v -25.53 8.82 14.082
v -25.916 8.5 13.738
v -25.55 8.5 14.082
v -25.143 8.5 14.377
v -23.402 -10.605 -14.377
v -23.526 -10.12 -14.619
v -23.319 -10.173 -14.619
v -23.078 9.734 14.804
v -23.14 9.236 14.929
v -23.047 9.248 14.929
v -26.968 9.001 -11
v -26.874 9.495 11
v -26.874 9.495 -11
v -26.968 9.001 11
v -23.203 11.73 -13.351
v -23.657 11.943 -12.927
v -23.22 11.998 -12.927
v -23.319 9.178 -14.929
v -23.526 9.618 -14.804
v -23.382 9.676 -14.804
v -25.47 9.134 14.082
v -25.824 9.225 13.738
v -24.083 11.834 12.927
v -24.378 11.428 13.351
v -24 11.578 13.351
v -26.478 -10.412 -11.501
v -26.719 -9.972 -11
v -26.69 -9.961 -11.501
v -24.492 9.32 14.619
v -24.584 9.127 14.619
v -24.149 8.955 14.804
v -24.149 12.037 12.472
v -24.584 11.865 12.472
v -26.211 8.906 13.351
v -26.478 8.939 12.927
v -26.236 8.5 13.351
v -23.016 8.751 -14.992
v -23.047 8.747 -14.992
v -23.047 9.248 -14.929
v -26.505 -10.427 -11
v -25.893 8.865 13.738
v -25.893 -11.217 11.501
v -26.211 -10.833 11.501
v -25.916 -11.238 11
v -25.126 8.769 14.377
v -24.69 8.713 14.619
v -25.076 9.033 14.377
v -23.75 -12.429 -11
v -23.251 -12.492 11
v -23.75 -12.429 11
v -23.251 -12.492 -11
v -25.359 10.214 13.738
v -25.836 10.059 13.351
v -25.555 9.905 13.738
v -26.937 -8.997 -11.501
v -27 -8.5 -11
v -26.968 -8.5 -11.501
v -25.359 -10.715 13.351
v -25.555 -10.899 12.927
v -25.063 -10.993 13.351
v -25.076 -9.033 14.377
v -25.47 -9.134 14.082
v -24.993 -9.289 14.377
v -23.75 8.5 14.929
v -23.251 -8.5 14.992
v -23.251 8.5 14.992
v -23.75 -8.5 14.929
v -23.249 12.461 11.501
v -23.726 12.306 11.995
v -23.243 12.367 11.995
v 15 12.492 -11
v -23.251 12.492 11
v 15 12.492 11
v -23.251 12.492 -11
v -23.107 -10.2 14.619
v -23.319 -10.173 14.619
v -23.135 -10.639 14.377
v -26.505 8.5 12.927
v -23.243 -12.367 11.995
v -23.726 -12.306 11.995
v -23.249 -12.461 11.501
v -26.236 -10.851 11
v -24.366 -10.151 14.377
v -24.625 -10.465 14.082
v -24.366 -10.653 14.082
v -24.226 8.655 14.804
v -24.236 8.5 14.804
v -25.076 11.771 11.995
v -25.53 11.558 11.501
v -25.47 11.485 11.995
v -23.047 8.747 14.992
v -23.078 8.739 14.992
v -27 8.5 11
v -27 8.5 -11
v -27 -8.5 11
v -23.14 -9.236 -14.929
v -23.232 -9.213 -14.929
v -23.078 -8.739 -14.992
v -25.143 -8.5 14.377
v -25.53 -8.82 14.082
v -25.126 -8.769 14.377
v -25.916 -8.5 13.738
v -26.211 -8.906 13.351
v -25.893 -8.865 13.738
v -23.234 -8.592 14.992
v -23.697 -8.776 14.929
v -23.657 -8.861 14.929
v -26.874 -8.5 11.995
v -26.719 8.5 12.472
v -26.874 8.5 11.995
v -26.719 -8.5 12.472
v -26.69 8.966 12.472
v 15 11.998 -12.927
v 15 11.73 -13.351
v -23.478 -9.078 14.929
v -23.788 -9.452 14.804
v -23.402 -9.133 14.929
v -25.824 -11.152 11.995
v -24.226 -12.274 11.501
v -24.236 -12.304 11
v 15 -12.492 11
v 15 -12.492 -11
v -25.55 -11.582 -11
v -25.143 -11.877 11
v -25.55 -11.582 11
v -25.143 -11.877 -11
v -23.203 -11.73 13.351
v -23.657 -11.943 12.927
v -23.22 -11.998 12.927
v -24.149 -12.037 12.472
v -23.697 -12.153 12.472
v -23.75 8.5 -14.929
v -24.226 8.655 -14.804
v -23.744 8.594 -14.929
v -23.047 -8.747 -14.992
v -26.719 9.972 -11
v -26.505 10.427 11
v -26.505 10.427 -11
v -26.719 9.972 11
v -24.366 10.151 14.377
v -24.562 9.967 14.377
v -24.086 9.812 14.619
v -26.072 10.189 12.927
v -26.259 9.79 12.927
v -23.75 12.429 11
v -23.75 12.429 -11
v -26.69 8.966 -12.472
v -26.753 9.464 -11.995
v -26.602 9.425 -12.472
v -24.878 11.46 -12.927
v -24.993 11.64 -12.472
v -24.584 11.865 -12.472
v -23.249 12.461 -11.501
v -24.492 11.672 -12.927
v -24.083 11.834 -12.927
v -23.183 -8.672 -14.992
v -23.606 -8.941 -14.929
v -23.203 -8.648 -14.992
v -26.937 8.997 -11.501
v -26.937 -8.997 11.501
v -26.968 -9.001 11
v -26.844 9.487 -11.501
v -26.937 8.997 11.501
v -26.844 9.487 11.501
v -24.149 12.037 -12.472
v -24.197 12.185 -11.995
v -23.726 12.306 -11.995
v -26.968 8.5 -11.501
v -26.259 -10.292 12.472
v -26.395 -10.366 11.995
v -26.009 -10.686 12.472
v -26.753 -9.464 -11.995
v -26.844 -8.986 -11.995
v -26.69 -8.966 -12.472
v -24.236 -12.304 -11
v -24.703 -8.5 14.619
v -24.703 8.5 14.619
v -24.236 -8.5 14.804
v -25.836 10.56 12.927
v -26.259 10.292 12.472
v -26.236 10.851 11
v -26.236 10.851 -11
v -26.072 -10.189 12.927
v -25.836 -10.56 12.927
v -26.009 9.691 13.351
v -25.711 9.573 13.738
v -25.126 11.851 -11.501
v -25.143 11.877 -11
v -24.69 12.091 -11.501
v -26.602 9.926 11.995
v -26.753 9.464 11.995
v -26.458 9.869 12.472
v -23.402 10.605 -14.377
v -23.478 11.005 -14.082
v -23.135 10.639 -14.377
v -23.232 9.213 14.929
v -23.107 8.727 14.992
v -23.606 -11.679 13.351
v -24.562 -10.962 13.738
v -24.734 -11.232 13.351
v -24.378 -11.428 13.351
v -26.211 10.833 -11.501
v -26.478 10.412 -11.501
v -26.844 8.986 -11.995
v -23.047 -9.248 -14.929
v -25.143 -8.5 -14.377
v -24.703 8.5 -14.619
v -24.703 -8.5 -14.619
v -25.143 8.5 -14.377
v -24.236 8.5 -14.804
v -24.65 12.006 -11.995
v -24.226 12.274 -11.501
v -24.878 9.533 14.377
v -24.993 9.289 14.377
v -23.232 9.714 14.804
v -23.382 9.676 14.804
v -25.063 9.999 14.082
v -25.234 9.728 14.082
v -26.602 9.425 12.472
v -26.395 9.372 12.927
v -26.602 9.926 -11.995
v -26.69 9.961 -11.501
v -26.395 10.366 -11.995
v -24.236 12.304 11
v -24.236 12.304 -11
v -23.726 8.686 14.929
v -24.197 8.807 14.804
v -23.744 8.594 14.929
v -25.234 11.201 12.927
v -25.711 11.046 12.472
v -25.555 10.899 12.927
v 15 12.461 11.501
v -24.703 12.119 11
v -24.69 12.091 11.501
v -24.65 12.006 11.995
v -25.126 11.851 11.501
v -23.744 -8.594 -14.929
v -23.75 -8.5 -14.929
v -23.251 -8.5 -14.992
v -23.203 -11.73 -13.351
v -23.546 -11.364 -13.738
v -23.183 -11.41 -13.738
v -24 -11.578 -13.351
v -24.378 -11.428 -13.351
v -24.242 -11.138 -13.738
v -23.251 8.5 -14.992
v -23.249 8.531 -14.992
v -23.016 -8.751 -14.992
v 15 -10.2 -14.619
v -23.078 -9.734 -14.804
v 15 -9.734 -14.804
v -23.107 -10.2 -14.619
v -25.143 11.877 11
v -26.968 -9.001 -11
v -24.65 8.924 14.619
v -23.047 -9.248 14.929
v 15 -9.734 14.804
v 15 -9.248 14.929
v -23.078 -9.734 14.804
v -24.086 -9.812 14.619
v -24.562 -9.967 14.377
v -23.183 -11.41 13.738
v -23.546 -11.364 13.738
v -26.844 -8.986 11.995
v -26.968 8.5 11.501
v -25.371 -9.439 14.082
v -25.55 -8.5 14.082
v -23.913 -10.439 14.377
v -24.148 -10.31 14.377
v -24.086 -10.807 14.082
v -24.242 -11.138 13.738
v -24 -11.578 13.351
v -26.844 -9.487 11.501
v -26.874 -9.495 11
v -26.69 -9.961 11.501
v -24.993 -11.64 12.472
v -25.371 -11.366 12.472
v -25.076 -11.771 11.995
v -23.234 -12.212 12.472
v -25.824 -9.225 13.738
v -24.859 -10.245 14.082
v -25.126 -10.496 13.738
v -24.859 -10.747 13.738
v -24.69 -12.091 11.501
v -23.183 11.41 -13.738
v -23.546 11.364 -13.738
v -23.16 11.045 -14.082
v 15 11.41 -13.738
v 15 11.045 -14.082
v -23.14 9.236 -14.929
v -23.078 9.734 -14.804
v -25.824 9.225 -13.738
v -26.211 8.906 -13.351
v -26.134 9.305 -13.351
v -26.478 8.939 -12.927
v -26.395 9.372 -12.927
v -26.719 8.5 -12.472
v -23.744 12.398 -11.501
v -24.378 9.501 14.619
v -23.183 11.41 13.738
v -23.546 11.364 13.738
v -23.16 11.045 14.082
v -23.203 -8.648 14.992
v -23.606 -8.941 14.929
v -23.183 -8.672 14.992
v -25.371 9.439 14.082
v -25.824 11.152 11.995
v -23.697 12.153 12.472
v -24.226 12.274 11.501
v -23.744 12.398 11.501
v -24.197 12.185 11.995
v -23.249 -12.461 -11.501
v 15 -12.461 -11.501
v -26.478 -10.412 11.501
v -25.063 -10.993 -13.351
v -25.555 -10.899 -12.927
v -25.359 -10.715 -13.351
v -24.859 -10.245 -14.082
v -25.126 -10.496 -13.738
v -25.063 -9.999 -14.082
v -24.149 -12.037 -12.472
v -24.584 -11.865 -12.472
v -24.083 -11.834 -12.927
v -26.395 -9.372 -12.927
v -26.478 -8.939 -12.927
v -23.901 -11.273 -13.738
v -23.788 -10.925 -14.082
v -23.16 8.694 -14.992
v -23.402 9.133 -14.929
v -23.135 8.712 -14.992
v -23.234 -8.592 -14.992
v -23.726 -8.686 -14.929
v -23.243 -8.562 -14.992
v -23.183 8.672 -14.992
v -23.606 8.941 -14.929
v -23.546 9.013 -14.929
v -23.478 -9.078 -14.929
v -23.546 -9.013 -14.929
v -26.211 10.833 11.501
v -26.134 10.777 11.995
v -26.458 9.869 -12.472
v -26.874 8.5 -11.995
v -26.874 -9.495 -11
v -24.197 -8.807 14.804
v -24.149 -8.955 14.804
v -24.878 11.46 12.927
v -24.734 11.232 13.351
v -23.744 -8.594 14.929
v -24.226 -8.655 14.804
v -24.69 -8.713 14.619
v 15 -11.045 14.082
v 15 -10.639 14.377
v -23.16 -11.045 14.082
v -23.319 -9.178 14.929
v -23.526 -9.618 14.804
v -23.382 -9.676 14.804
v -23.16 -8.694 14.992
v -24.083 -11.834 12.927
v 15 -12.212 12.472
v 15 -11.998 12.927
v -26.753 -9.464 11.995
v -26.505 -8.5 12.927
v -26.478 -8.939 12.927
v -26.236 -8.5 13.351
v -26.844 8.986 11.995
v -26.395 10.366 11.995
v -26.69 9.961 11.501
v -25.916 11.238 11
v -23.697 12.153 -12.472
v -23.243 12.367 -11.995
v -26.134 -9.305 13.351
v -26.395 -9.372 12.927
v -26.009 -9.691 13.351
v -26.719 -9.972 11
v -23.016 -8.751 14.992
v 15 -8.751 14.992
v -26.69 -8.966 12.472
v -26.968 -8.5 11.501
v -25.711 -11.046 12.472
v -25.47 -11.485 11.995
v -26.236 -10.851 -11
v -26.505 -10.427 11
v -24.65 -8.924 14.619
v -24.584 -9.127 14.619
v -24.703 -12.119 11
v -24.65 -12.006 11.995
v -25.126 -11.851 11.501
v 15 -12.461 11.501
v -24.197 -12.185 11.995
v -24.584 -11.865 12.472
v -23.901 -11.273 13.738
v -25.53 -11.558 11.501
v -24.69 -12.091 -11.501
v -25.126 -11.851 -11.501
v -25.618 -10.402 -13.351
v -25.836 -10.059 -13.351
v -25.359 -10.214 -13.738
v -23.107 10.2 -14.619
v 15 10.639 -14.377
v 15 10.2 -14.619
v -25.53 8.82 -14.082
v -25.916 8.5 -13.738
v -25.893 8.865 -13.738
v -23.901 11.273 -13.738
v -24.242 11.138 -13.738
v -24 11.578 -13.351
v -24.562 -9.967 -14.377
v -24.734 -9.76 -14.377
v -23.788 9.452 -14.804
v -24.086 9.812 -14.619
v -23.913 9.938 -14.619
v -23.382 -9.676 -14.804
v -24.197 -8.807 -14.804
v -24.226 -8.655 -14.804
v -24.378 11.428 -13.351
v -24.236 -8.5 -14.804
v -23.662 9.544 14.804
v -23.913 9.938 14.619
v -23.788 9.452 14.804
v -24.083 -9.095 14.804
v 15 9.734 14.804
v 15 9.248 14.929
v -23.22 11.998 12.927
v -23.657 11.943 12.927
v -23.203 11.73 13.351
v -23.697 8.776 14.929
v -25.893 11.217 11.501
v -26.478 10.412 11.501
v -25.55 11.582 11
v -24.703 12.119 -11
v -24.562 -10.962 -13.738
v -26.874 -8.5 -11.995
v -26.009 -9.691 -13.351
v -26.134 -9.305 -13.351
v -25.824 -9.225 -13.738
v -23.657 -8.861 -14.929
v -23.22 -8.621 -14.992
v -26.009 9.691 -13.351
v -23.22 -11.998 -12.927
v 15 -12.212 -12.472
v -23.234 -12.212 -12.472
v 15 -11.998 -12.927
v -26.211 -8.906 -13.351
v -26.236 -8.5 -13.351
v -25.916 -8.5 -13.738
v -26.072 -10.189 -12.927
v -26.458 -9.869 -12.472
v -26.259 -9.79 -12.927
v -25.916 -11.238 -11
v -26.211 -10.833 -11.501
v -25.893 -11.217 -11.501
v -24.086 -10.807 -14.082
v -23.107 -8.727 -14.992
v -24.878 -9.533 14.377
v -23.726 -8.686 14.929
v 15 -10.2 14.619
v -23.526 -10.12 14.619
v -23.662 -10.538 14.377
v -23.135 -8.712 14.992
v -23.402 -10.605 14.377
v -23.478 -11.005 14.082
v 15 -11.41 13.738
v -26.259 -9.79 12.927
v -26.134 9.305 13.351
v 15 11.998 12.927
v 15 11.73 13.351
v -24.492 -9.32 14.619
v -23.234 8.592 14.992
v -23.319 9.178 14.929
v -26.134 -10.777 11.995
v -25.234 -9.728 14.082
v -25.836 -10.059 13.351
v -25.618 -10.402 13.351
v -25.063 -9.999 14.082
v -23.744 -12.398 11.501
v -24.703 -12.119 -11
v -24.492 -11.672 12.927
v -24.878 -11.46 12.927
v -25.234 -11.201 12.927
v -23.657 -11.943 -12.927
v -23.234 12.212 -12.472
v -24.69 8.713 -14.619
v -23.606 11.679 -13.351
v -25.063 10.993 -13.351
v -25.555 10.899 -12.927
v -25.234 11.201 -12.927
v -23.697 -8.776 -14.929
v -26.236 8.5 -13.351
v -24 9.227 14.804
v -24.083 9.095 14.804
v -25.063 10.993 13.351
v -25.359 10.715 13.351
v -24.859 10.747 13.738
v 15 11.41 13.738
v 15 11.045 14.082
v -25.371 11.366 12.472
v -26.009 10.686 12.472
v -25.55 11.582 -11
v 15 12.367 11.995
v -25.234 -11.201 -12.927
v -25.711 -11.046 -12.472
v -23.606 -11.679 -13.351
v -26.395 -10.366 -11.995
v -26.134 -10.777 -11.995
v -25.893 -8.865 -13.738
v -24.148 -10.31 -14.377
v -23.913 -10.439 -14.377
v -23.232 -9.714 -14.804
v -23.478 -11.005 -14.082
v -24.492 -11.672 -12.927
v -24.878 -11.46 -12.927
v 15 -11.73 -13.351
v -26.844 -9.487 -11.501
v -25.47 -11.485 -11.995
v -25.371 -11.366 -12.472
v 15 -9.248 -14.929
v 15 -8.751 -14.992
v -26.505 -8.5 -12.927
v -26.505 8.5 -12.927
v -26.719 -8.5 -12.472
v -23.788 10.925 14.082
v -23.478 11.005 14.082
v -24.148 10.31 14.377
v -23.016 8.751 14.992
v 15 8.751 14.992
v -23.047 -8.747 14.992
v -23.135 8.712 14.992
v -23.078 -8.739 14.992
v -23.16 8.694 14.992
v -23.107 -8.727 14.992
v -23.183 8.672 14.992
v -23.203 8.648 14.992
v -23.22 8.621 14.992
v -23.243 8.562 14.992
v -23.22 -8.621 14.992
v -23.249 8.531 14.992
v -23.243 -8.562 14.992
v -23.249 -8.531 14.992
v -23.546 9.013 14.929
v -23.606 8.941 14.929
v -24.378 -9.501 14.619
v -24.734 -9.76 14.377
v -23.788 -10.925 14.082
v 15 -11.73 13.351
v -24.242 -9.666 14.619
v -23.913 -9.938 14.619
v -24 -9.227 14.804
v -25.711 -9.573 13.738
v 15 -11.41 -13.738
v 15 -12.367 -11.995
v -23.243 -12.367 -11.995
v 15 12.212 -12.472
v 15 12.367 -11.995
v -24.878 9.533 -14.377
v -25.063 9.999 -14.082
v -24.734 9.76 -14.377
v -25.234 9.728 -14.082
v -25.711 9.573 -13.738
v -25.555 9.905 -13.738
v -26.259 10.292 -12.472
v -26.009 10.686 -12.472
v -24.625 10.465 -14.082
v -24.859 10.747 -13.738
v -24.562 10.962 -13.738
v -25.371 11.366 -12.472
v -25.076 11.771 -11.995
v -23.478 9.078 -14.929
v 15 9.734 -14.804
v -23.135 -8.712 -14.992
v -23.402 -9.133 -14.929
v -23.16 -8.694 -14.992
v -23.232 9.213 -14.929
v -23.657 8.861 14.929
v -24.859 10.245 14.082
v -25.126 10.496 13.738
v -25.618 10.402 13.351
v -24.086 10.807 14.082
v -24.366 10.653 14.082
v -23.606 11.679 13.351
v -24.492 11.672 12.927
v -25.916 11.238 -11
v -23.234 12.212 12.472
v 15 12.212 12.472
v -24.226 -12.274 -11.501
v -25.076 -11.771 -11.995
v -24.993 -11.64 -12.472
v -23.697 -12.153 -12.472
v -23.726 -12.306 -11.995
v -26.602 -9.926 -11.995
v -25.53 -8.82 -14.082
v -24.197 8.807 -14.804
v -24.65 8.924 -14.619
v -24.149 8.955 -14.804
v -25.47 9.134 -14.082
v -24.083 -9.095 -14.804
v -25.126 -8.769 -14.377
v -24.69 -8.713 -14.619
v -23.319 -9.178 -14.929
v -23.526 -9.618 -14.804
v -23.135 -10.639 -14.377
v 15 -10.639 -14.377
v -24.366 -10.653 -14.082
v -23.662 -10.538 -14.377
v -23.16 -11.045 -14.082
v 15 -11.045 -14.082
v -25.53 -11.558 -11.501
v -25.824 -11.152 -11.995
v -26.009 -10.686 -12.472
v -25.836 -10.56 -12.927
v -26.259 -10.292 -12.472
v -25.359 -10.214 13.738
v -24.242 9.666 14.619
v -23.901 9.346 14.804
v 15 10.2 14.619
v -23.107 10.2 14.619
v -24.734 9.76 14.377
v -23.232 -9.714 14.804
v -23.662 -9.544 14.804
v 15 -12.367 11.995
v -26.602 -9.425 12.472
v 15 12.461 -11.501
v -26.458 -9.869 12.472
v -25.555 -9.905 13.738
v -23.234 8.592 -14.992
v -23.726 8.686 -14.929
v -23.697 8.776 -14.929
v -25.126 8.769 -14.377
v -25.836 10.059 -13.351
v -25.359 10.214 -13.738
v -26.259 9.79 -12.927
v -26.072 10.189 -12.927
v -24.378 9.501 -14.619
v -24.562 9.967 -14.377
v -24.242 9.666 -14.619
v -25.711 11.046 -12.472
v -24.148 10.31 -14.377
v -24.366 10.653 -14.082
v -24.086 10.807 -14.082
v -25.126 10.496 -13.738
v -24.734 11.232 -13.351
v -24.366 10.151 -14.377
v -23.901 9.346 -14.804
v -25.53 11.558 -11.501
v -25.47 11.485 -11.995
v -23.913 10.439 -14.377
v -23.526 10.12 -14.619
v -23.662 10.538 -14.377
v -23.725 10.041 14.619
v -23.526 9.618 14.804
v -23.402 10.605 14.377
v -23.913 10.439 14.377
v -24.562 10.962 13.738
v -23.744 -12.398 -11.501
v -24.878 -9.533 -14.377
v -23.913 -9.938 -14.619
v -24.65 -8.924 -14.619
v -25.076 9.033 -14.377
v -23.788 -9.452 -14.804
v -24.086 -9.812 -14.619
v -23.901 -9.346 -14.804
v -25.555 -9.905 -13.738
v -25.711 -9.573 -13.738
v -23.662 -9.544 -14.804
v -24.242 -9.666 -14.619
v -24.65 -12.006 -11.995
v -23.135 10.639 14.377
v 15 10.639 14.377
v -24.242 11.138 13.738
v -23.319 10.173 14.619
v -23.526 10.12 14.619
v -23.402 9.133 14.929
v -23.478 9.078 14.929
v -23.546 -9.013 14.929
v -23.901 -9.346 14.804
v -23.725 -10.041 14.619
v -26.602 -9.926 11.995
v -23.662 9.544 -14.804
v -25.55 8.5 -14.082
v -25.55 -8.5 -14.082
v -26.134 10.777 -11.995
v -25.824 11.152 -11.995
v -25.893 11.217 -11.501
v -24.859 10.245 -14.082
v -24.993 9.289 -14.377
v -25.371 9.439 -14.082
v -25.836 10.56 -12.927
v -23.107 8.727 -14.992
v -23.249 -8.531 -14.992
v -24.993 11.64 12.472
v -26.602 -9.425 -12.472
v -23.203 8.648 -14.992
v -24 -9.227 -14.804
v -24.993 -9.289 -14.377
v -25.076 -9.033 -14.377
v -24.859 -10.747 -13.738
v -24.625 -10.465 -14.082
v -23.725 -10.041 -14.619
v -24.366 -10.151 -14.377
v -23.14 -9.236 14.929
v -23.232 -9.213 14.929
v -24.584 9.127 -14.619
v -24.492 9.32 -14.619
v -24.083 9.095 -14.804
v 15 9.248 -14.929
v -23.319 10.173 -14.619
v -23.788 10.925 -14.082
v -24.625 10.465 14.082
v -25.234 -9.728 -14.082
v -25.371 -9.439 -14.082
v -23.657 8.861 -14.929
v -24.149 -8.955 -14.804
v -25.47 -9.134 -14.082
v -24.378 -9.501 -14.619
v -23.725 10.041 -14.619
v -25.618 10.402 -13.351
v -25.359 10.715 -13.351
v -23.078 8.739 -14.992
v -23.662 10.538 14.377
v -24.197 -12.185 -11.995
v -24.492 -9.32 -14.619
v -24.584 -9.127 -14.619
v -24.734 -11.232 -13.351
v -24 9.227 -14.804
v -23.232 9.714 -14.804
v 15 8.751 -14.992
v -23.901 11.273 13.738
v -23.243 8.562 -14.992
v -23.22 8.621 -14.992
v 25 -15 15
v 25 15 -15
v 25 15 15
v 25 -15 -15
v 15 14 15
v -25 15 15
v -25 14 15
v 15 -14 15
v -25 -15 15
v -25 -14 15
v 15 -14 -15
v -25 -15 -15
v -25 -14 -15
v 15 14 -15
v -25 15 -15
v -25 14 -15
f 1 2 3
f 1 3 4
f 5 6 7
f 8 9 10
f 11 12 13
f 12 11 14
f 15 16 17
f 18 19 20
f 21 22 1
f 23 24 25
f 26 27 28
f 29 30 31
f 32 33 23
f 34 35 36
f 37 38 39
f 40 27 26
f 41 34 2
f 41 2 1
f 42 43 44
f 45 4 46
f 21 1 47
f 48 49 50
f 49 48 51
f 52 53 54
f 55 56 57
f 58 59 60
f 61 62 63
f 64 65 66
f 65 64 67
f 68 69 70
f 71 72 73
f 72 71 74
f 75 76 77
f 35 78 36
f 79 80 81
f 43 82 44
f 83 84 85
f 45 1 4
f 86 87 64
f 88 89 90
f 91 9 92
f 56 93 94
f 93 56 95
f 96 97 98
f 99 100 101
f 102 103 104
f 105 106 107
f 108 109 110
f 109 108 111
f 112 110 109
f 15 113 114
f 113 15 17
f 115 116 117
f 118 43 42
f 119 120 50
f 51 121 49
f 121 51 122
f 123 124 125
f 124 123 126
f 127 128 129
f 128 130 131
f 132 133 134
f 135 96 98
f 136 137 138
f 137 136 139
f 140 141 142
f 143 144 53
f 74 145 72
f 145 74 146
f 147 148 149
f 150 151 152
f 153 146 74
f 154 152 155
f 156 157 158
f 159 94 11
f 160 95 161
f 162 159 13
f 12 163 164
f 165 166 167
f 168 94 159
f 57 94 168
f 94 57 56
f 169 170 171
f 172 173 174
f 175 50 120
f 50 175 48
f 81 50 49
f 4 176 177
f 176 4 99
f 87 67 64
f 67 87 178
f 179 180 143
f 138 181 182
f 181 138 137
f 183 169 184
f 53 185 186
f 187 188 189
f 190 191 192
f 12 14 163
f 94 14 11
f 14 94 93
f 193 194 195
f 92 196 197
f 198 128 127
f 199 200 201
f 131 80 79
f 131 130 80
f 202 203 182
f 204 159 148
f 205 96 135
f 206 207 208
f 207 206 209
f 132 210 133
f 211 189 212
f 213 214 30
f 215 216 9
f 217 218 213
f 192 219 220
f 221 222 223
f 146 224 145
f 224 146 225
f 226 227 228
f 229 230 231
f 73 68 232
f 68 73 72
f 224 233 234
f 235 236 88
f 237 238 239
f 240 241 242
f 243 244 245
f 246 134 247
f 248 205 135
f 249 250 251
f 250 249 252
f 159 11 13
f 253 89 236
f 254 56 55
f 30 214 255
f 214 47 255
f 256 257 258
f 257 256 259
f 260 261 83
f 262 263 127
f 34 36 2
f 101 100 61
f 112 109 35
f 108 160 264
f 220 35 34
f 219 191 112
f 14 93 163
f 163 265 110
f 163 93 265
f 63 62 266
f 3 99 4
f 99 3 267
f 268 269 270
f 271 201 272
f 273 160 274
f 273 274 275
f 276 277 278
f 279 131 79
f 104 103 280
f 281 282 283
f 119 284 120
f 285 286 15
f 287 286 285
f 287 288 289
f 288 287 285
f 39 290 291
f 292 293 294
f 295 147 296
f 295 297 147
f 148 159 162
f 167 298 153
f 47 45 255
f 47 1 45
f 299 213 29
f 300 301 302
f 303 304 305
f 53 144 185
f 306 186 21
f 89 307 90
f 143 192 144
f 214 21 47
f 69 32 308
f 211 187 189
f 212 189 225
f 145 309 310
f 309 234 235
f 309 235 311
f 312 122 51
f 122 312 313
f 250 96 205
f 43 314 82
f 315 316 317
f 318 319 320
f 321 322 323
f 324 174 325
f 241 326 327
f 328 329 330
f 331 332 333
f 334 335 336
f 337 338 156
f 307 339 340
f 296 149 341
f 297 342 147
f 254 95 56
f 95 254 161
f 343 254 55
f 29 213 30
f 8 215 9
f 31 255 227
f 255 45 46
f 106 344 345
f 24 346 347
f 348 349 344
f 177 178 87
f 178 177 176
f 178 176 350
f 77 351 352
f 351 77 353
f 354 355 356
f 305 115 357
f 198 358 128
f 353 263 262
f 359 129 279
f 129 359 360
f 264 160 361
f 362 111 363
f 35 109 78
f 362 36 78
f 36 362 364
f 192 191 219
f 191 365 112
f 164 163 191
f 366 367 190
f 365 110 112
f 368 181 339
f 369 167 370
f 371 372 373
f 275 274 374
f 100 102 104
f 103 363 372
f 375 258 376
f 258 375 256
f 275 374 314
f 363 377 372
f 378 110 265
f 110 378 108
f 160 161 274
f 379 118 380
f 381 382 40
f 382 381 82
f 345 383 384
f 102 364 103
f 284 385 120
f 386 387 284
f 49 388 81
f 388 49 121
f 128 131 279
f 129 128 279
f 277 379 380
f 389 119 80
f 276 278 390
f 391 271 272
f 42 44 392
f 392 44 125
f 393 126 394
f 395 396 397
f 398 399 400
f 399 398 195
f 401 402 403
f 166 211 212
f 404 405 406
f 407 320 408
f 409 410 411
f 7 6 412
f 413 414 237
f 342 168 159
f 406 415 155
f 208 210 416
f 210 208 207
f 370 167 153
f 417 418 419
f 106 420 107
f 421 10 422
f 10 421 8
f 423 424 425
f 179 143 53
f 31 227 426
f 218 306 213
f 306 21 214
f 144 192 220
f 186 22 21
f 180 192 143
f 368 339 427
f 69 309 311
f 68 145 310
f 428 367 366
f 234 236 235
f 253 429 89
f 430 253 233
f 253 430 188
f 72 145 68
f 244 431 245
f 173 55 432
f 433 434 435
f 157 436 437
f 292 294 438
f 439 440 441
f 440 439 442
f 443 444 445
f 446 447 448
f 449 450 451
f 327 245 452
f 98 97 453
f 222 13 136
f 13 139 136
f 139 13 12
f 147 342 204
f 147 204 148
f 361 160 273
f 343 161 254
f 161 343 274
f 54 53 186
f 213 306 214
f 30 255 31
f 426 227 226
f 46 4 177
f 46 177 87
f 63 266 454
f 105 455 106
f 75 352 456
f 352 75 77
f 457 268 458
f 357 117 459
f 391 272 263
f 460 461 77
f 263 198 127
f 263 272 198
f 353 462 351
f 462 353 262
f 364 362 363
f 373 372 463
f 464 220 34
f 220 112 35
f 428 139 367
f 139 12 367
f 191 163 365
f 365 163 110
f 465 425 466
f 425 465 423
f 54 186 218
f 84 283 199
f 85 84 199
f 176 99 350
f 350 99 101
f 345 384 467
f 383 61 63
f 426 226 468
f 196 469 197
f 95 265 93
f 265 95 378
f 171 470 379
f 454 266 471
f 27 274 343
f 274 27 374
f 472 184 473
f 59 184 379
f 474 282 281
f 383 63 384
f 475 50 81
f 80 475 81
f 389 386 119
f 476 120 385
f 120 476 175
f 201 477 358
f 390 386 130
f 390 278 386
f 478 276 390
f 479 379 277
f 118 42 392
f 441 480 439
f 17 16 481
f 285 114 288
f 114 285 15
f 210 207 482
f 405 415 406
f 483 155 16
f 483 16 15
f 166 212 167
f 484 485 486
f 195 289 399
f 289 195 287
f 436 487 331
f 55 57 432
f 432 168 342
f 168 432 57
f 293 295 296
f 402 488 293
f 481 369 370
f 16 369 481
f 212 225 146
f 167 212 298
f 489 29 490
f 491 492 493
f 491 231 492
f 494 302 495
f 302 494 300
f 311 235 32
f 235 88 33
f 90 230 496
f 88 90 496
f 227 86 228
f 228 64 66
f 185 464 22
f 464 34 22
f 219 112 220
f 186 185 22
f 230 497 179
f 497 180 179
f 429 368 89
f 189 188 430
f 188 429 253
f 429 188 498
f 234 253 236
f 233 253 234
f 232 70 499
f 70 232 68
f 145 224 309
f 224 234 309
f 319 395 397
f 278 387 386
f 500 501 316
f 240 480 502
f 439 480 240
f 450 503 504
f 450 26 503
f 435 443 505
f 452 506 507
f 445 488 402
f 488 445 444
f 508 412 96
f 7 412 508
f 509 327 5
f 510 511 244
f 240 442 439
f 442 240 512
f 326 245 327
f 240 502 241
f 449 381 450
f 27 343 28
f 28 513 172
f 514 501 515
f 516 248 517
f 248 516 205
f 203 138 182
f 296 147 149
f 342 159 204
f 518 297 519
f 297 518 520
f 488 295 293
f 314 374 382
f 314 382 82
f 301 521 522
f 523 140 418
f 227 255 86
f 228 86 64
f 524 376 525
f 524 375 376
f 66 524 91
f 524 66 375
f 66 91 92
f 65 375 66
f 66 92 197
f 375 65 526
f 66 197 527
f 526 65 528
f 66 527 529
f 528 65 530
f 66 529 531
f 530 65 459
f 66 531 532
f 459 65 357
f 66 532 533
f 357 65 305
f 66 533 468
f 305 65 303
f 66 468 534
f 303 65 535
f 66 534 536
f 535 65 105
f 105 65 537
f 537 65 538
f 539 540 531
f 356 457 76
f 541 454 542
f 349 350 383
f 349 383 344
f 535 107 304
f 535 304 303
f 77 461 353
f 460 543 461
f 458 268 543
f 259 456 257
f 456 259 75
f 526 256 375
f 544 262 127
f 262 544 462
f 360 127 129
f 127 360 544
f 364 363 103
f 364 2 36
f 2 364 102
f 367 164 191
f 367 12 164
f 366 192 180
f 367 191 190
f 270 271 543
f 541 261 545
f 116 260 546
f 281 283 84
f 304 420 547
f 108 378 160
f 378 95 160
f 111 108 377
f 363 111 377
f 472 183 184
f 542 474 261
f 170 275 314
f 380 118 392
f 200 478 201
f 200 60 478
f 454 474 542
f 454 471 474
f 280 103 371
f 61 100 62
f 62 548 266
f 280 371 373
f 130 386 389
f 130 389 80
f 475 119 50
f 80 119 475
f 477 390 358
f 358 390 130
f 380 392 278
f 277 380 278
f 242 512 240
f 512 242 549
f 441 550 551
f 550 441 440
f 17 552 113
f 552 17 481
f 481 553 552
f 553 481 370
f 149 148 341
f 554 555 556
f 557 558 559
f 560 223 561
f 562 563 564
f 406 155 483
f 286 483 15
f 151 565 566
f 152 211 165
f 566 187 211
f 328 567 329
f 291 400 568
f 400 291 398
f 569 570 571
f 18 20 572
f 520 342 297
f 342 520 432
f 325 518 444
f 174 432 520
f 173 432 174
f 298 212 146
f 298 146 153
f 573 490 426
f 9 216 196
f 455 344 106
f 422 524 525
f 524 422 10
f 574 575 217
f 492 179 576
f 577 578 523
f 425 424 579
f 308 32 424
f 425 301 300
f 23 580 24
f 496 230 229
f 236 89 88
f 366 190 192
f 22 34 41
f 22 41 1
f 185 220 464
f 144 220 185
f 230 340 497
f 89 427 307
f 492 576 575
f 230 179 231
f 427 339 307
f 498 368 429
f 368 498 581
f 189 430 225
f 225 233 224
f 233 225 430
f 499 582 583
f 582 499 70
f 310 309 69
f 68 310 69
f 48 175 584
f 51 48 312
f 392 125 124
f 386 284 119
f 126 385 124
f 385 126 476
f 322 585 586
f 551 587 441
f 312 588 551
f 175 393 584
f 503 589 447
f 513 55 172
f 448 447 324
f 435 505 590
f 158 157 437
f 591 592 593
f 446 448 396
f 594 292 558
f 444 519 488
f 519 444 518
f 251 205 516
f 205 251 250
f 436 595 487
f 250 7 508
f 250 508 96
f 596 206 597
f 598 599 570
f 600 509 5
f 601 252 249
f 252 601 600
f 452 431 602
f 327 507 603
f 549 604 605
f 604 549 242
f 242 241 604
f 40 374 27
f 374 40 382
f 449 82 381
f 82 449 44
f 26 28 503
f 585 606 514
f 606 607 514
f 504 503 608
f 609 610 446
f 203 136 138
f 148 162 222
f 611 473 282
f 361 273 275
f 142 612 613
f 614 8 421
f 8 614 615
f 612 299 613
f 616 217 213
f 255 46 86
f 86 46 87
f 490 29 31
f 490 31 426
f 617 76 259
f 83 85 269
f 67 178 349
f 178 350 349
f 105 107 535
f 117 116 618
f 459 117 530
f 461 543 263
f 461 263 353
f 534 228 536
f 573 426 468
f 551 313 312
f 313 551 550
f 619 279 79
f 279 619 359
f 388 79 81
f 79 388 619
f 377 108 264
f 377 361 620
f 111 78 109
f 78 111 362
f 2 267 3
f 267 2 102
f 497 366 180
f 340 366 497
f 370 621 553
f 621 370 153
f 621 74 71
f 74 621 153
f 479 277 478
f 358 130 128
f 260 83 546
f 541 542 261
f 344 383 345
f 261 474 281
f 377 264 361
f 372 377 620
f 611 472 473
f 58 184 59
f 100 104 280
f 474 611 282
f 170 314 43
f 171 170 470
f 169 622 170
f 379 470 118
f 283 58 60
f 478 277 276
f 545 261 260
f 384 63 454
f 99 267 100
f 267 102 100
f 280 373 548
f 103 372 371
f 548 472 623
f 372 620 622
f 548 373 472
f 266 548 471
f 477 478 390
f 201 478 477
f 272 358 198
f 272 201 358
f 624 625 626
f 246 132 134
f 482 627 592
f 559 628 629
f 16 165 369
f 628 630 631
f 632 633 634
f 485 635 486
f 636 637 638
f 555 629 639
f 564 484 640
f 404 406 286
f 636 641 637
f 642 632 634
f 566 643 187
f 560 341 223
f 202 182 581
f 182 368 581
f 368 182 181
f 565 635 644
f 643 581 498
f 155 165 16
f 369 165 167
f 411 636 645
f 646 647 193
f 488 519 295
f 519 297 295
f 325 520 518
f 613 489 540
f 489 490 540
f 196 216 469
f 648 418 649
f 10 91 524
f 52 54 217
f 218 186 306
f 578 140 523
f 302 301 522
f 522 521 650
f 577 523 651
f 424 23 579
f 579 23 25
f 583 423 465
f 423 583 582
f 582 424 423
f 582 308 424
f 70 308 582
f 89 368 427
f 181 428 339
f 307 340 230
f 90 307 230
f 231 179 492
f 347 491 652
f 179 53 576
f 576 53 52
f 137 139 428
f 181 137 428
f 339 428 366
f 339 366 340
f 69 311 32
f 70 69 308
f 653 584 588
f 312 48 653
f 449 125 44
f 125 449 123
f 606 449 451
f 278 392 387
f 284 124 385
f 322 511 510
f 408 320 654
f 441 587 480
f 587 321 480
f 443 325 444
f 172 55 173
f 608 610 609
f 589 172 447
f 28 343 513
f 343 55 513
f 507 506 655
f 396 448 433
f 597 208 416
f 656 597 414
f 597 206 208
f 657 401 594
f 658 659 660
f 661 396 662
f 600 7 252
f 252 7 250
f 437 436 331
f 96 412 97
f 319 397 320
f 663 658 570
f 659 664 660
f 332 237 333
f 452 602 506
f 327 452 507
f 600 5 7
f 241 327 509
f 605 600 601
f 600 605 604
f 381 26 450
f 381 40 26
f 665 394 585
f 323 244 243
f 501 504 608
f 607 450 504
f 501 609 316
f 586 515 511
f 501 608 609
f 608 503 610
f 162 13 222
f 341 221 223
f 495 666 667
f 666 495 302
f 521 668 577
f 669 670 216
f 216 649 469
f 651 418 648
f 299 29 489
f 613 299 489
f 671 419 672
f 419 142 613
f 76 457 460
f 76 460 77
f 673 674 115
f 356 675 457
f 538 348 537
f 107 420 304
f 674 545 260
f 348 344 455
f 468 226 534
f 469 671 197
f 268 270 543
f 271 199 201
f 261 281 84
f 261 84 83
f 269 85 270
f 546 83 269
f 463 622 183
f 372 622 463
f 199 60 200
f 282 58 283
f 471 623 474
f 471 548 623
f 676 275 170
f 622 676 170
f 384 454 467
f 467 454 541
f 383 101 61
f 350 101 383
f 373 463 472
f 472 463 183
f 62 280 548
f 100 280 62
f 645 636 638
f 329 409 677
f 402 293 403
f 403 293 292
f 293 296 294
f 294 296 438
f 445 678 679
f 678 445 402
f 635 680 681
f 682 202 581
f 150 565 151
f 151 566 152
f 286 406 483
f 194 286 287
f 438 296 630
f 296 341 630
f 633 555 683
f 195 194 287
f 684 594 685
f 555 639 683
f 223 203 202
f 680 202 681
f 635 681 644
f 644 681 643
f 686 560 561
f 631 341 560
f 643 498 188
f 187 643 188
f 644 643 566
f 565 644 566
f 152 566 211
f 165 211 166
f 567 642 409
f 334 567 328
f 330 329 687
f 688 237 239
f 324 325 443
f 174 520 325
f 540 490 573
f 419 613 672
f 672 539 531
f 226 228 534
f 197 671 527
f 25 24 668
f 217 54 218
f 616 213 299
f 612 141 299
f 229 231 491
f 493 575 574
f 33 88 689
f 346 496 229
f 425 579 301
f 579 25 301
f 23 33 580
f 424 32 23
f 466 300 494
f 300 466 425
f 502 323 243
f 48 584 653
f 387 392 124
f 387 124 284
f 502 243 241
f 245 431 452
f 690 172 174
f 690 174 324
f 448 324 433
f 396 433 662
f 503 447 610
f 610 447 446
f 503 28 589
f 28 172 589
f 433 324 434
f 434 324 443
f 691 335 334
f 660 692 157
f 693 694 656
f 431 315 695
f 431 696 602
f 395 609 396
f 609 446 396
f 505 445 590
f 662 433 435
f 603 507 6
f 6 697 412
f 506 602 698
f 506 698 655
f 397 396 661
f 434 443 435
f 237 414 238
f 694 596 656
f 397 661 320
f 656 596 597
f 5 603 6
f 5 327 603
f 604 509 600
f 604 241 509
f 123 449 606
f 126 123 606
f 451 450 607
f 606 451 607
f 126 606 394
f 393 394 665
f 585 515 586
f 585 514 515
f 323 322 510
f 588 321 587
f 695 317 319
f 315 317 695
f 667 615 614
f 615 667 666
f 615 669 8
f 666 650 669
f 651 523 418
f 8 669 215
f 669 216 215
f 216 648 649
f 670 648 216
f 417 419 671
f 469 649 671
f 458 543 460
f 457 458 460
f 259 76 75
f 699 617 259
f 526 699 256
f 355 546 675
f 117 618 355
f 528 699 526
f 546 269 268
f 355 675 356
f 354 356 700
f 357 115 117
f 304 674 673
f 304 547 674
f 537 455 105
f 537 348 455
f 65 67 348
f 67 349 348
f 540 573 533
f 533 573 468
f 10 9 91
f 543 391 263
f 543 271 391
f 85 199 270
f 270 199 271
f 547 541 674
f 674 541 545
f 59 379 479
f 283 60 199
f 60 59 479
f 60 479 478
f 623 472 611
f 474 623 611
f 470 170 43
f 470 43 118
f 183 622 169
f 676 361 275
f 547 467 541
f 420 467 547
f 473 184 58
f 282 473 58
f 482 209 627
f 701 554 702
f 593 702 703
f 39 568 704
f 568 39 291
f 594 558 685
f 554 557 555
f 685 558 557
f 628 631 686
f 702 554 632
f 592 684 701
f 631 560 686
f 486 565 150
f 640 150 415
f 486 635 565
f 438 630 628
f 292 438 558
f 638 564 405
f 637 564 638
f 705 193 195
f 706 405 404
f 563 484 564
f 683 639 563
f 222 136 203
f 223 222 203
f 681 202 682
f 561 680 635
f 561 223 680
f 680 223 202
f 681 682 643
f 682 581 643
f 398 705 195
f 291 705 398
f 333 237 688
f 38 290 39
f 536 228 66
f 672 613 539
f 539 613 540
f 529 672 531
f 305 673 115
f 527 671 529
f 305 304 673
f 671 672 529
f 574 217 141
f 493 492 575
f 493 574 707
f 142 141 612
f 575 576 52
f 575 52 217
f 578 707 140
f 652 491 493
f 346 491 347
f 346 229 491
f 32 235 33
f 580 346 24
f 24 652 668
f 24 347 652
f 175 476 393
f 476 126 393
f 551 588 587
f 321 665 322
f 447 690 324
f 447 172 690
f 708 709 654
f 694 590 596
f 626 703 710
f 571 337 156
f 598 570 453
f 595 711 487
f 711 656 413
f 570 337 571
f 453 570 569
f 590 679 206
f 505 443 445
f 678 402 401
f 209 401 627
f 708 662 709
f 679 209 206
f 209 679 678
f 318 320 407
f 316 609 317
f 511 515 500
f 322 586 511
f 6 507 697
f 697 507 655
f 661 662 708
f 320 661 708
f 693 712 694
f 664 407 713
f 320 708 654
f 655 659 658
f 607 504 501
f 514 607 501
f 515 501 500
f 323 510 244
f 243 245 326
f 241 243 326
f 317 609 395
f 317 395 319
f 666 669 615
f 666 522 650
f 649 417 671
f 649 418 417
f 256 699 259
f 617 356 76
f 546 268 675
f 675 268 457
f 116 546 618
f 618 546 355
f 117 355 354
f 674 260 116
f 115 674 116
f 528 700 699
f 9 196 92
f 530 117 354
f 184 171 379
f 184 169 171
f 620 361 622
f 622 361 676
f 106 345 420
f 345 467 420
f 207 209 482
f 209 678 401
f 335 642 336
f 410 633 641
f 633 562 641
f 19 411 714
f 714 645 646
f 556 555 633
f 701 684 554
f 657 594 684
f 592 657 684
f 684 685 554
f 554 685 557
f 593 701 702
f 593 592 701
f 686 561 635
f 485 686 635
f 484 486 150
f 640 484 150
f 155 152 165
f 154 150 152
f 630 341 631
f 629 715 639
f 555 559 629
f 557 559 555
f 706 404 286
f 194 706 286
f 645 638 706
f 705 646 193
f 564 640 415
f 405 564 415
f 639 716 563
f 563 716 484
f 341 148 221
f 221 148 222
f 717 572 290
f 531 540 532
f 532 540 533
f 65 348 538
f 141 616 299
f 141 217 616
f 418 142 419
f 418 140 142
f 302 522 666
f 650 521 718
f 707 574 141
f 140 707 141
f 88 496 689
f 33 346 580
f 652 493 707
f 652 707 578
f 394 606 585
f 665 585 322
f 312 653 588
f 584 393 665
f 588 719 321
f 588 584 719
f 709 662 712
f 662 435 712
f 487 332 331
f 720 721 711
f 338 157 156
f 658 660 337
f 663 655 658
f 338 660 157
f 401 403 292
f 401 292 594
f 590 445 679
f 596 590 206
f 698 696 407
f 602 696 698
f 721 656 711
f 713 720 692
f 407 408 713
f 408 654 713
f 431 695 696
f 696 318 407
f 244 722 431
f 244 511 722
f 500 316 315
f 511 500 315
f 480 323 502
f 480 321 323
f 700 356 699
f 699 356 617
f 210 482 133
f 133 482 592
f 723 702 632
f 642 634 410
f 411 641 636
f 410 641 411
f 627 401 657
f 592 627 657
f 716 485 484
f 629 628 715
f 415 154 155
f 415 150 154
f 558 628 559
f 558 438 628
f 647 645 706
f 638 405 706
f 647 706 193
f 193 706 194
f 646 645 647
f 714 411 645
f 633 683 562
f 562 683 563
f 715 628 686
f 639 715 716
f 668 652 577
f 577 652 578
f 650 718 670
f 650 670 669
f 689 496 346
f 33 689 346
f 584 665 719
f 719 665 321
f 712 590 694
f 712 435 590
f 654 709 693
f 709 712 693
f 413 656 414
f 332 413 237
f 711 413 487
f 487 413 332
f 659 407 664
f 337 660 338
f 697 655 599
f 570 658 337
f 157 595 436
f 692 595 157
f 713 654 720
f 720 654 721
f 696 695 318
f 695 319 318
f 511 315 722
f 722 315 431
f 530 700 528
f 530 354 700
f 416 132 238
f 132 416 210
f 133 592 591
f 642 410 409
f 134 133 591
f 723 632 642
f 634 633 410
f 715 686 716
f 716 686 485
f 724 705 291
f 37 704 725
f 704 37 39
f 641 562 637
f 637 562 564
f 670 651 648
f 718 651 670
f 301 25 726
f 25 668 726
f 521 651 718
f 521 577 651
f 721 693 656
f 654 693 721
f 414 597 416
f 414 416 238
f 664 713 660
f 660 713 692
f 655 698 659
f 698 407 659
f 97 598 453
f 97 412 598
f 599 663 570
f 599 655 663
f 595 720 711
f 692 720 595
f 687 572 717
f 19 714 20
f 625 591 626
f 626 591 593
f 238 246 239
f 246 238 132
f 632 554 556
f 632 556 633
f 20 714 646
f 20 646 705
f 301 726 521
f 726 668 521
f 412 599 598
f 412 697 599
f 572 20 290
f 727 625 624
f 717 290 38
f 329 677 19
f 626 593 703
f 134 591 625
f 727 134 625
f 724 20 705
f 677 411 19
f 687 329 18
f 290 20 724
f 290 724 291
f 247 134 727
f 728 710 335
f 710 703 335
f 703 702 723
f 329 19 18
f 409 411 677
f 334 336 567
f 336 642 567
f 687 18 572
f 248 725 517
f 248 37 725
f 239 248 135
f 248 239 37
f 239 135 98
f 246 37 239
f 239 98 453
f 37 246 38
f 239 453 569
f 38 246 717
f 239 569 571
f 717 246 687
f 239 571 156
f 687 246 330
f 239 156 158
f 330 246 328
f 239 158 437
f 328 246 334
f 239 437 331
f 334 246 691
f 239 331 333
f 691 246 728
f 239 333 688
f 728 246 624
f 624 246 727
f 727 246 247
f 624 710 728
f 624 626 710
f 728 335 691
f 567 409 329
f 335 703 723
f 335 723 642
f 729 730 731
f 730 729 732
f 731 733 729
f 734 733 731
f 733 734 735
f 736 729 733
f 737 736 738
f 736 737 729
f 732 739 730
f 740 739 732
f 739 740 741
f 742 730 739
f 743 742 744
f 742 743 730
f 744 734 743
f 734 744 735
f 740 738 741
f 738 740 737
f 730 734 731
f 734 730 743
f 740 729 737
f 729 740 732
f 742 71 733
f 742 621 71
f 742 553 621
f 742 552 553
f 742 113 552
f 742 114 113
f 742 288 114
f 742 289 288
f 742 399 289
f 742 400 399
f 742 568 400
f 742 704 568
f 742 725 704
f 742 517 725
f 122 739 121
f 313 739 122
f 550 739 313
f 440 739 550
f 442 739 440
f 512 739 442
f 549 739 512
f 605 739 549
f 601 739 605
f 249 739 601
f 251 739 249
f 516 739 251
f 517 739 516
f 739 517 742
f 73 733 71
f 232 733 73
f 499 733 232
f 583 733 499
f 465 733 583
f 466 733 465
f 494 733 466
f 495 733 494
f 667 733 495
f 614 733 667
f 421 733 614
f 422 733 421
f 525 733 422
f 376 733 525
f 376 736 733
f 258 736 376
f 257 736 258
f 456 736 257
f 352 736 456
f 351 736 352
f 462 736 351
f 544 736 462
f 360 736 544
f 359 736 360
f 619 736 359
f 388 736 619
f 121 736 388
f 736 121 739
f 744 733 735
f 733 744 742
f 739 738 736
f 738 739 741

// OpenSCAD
$fs = 1;
$fn = 50;

gap_thickness = 1;

grip_thickness = 1;

block_length = 50;
block_thickness = 30;
socket_length = 10;

color([0.25,0.5,1])
  translate([0,-0,-0])
    intersection() {
      cubeRounded(block_length, 21, 26, 4);
      translate([-socket_length/2,0,0]) cube([block_length,100,100], center=true);
    }

difference() {
  cube([50,block_thickness,block_thickness], center=true);
  translate([  -socket_length, 0, 0]) cube([block_length, block_thickness-grip_thickness*2, 999], center=true);
  
  translate([-33, -14.5, 0])   cube([15, 3, 40], center=true);
  translate([-33,  14.5, 0])   cube([15, 3, 40], center=true);
}

module cubeRounded(x, y, z, r) {
  minkowski() {
    cube([x-r, y-r, z-r], center=true);
    sphere(r=r);
  }
}
